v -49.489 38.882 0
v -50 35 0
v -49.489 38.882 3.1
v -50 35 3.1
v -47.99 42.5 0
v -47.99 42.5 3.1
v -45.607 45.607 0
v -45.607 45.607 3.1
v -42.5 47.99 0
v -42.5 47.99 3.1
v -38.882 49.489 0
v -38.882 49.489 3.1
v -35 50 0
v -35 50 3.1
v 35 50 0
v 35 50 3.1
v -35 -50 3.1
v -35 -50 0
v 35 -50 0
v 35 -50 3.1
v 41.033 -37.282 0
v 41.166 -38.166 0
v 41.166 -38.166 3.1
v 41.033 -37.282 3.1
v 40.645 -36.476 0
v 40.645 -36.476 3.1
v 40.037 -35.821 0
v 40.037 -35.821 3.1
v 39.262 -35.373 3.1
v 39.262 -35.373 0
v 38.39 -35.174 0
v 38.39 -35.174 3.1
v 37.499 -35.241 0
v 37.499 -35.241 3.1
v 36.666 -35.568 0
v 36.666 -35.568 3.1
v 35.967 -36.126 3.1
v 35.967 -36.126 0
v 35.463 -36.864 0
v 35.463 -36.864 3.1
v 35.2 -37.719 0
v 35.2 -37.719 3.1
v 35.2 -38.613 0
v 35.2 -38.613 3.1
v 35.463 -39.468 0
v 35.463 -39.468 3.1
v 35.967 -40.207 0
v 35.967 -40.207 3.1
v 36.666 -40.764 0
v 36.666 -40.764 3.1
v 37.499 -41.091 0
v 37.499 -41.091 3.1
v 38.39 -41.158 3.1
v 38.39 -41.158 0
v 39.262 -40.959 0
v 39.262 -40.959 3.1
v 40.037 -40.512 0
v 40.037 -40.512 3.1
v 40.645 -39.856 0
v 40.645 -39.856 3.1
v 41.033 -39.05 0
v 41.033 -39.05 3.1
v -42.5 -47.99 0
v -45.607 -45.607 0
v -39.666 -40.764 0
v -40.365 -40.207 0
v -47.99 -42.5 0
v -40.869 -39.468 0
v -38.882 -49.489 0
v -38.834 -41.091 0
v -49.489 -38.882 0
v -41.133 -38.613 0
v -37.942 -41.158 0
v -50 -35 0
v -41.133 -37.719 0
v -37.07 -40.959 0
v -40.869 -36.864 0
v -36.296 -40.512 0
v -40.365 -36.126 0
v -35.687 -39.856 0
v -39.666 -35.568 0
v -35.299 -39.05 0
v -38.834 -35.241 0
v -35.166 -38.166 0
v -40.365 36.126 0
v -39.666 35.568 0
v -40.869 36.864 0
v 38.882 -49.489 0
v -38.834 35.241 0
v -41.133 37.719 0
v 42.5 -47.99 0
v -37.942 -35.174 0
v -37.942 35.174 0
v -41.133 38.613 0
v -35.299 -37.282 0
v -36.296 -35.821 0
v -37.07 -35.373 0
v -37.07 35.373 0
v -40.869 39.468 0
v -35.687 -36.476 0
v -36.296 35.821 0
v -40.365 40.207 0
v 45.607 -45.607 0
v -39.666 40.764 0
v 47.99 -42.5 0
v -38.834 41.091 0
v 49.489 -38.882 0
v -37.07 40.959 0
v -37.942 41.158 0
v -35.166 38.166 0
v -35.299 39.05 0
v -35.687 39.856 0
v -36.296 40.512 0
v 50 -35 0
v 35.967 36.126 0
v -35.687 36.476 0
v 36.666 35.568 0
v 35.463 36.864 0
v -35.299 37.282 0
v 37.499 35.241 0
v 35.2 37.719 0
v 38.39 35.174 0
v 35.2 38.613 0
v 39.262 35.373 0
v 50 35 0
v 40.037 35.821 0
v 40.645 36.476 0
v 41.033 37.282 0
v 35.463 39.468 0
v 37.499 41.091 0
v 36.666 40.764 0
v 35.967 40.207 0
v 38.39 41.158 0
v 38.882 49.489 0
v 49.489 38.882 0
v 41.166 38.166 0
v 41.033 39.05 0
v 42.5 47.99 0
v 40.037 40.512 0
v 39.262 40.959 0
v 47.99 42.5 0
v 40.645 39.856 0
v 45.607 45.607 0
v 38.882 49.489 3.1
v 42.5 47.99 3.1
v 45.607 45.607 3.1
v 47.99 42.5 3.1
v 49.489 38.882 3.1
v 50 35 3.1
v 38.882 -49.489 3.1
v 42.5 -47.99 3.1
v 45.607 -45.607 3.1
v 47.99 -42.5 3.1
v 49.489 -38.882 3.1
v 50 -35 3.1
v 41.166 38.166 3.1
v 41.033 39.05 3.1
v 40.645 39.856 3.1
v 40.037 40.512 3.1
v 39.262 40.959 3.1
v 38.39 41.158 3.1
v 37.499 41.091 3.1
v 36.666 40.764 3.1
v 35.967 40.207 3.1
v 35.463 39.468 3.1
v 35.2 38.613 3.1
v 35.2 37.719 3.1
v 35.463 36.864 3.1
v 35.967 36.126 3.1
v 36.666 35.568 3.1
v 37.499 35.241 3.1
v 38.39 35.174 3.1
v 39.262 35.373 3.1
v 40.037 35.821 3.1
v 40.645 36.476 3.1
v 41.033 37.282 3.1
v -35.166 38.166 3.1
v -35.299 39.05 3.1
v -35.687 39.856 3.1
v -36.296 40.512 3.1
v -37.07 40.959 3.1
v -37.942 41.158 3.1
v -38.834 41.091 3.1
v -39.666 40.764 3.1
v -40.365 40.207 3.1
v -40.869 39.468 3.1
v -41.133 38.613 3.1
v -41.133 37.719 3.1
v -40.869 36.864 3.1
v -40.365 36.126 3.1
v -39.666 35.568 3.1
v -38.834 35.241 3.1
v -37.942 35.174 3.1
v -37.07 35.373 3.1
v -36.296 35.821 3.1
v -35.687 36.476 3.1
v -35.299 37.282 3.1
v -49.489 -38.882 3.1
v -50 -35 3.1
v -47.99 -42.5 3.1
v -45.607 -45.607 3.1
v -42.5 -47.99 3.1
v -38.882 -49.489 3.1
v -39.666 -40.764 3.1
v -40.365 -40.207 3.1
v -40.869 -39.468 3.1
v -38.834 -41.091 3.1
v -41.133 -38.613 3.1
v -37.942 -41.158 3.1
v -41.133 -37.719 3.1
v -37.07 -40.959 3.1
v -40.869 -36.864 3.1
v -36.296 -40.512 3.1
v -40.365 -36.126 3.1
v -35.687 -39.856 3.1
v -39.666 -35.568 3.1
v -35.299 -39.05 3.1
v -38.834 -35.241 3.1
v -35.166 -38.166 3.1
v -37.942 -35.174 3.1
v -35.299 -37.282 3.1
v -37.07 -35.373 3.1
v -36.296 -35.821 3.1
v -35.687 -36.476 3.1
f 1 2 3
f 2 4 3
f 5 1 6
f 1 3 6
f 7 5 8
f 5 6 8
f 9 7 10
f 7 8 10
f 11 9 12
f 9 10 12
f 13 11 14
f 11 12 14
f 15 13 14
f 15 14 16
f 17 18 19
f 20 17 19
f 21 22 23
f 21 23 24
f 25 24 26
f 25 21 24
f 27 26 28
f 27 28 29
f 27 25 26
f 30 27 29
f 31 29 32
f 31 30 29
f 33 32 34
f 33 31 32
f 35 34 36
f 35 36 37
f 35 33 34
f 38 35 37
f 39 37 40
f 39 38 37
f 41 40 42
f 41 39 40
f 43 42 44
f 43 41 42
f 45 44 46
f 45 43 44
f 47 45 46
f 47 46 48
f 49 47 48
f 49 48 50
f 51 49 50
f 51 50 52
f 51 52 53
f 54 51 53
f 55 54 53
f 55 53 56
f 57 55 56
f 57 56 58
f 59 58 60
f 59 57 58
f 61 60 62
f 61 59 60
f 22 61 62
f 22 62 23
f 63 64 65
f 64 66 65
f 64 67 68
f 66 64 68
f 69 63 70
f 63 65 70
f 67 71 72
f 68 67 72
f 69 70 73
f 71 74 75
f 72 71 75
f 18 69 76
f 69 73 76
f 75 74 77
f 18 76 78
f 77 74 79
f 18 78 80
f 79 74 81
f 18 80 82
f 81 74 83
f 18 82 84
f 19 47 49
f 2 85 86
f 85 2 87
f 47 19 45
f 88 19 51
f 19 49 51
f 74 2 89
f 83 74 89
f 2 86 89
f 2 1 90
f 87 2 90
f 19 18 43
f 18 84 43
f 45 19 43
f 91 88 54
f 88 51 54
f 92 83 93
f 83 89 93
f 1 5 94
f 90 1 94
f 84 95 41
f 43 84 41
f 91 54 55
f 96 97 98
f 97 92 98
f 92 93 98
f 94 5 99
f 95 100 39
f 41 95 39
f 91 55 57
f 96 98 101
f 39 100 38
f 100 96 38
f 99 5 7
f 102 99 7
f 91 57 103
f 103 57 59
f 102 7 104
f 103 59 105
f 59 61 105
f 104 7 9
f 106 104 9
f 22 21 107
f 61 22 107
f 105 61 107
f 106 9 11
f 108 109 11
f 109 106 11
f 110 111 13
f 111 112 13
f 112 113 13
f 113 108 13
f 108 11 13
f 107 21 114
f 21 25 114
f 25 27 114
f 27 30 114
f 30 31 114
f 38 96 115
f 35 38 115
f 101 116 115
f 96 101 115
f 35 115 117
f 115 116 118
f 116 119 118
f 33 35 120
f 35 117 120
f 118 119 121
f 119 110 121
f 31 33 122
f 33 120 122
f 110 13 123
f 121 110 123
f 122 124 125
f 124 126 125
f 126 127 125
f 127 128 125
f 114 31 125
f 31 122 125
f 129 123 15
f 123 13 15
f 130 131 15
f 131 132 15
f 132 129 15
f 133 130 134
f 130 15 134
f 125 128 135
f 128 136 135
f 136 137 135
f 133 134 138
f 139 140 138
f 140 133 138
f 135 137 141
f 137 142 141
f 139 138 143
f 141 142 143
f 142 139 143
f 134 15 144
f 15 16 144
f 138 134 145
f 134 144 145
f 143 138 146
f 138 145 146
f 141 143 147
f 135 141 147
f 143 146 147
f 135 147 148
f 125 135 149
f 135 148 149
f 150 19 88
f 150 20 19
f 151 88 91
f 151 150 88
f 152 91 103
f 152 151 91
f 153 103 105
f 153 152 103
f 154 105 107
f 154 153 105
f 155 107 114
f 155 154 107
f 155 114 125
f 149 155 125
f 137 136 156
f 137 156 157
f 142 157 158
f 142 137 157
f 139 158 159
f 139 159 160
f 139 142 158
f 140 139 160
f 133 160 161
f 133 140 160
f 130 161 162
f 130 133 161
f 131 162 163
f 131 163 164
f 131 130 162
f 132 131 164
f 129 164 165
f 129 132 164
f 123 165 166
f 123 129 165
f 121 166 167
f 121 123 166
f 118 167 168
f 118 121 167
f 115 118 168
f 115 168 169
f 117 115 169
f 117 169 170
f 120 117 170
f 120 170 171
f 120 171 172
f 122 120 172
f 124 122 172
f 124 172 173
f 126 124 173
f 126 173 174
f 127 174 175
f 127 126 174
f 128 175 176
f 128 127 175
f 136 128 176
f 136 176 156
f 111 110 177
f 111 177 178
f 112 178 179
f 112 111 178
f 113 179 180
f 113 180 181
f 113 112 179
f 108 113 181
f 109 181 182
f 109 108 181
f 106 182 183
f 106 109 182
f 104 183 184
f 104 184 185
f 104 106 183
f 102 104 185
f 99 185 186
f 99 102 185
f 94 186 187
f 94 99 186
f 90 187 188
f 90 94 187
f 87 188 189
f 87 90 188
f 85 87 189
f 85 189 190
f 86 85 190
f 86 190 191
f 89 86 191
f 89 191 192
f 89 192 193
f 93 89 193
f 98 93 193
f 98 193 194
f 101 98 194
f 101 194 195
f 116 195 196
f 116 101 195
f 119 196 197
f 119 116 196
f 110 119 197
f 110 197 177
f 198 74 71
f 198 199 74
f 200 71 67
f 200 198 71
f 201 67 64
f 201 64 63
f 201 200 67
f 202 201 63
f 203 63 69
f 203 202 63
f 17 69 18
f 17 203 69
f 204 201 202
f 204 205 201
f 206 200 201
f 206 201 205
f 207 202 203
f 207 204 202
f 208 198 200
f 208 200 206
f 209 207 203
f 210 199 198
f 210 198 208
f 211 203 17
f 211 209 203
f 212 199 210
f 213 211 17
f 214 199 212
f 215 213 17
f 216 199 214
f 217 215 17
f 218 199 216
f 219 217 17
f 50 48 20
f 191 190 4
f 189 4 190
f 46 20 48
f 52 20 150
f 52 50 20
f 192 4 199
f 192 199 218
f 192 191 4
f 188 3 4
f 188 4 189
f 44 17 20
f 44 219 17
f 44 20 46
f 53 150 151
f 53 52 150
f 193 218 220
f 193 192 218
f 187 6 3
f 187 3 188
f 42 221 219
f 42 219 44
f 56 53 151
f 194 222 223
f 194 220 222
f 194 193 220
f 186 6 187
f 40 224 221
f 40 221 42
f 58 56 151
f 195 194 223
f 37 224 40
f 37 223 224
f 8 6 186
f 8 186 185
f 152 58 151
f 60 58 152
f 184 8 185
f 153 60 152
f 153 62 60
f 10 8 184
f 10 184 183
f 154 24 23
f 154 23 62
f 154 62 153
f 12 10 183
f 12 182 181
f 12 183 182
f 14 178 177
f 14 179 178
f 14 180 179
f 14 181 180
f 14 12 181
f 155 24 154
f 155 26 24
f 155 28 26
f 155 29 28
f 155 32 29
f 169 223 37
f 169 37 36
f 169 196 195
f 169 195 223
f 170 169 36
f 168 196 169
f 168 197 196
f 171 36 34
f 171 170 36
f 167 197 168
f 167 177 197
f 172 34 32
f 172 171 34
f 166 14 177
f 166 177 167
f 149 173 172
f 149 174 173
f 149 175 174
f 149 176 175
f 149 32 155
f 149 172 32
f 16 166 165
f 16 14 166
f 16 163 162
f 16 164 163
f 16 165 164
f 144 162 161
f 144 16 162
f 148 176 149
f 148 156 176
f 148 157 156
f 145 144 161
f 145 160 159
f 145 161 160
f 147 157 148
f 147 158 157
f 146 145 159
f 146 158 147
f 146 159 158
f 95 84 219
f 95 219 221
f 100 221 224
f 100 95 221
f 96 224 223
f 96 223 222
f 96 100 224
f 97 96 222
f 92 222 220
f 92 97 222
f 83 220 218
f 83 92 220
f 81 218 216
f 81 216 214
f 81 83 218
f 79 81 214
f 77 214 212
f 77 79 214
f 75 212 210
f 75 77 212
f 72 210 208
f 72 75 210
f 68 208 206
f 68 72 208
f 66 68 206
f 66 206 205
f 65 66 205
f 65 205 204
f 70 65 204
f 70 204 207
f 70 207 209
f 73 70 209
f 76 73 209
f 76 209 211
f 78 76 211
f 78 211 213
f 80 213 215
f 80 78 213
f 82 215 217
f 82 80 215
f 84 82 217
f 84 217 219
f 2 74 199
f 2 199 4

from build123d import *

# Parameters (mm, degrees)
SKETCH1_W           = 100
SKETCH1_H           = 100
SKETCH1_R           = 3
BOSS_EXTRUDE2_DEPTH = 3.1
FILLET1_R           = 15


with BuildPart() as part:
    # Sketch1 → Boss-Extrude2 (new body)
    with BuildSketch(Plane.XY):
        Rectangle(SKETCH1_W, SKETCH1_H)
        with Locations((-38.166088515, 38.166088515)):
            Circle(SKETCH1_R, mode=Mode.SUBTRACT)
        with Locations((38.166088515, 38.166088515)):
            Circle(SKETCH1_R, mode=Mode.SUBTRACT)
        with Locations((38.166088515, -38.166088515)):
            Circle(SKETCH1_R, mode=Mode.SUBTRACT)
        with Locations((-38.166088515, -38.166088515)):
            Circle(SKETCH1_R, mode=Mode.SUBTRACT)
    extrude(amount=BOSS_EXTRUDE2_DEPTH)

    # Fillet1
    fillet1_edges = [part.edges().sort_by_distance(p)[0] for p in [
        (50, -50, 1.55),
        (-50, -50, 1.55),
        (-50, 50, 1.55),
        (50, 50, 1.55),
    ]]
    fillet(fillet1_edges, radius=FILLET1_R)


solid = part.part
